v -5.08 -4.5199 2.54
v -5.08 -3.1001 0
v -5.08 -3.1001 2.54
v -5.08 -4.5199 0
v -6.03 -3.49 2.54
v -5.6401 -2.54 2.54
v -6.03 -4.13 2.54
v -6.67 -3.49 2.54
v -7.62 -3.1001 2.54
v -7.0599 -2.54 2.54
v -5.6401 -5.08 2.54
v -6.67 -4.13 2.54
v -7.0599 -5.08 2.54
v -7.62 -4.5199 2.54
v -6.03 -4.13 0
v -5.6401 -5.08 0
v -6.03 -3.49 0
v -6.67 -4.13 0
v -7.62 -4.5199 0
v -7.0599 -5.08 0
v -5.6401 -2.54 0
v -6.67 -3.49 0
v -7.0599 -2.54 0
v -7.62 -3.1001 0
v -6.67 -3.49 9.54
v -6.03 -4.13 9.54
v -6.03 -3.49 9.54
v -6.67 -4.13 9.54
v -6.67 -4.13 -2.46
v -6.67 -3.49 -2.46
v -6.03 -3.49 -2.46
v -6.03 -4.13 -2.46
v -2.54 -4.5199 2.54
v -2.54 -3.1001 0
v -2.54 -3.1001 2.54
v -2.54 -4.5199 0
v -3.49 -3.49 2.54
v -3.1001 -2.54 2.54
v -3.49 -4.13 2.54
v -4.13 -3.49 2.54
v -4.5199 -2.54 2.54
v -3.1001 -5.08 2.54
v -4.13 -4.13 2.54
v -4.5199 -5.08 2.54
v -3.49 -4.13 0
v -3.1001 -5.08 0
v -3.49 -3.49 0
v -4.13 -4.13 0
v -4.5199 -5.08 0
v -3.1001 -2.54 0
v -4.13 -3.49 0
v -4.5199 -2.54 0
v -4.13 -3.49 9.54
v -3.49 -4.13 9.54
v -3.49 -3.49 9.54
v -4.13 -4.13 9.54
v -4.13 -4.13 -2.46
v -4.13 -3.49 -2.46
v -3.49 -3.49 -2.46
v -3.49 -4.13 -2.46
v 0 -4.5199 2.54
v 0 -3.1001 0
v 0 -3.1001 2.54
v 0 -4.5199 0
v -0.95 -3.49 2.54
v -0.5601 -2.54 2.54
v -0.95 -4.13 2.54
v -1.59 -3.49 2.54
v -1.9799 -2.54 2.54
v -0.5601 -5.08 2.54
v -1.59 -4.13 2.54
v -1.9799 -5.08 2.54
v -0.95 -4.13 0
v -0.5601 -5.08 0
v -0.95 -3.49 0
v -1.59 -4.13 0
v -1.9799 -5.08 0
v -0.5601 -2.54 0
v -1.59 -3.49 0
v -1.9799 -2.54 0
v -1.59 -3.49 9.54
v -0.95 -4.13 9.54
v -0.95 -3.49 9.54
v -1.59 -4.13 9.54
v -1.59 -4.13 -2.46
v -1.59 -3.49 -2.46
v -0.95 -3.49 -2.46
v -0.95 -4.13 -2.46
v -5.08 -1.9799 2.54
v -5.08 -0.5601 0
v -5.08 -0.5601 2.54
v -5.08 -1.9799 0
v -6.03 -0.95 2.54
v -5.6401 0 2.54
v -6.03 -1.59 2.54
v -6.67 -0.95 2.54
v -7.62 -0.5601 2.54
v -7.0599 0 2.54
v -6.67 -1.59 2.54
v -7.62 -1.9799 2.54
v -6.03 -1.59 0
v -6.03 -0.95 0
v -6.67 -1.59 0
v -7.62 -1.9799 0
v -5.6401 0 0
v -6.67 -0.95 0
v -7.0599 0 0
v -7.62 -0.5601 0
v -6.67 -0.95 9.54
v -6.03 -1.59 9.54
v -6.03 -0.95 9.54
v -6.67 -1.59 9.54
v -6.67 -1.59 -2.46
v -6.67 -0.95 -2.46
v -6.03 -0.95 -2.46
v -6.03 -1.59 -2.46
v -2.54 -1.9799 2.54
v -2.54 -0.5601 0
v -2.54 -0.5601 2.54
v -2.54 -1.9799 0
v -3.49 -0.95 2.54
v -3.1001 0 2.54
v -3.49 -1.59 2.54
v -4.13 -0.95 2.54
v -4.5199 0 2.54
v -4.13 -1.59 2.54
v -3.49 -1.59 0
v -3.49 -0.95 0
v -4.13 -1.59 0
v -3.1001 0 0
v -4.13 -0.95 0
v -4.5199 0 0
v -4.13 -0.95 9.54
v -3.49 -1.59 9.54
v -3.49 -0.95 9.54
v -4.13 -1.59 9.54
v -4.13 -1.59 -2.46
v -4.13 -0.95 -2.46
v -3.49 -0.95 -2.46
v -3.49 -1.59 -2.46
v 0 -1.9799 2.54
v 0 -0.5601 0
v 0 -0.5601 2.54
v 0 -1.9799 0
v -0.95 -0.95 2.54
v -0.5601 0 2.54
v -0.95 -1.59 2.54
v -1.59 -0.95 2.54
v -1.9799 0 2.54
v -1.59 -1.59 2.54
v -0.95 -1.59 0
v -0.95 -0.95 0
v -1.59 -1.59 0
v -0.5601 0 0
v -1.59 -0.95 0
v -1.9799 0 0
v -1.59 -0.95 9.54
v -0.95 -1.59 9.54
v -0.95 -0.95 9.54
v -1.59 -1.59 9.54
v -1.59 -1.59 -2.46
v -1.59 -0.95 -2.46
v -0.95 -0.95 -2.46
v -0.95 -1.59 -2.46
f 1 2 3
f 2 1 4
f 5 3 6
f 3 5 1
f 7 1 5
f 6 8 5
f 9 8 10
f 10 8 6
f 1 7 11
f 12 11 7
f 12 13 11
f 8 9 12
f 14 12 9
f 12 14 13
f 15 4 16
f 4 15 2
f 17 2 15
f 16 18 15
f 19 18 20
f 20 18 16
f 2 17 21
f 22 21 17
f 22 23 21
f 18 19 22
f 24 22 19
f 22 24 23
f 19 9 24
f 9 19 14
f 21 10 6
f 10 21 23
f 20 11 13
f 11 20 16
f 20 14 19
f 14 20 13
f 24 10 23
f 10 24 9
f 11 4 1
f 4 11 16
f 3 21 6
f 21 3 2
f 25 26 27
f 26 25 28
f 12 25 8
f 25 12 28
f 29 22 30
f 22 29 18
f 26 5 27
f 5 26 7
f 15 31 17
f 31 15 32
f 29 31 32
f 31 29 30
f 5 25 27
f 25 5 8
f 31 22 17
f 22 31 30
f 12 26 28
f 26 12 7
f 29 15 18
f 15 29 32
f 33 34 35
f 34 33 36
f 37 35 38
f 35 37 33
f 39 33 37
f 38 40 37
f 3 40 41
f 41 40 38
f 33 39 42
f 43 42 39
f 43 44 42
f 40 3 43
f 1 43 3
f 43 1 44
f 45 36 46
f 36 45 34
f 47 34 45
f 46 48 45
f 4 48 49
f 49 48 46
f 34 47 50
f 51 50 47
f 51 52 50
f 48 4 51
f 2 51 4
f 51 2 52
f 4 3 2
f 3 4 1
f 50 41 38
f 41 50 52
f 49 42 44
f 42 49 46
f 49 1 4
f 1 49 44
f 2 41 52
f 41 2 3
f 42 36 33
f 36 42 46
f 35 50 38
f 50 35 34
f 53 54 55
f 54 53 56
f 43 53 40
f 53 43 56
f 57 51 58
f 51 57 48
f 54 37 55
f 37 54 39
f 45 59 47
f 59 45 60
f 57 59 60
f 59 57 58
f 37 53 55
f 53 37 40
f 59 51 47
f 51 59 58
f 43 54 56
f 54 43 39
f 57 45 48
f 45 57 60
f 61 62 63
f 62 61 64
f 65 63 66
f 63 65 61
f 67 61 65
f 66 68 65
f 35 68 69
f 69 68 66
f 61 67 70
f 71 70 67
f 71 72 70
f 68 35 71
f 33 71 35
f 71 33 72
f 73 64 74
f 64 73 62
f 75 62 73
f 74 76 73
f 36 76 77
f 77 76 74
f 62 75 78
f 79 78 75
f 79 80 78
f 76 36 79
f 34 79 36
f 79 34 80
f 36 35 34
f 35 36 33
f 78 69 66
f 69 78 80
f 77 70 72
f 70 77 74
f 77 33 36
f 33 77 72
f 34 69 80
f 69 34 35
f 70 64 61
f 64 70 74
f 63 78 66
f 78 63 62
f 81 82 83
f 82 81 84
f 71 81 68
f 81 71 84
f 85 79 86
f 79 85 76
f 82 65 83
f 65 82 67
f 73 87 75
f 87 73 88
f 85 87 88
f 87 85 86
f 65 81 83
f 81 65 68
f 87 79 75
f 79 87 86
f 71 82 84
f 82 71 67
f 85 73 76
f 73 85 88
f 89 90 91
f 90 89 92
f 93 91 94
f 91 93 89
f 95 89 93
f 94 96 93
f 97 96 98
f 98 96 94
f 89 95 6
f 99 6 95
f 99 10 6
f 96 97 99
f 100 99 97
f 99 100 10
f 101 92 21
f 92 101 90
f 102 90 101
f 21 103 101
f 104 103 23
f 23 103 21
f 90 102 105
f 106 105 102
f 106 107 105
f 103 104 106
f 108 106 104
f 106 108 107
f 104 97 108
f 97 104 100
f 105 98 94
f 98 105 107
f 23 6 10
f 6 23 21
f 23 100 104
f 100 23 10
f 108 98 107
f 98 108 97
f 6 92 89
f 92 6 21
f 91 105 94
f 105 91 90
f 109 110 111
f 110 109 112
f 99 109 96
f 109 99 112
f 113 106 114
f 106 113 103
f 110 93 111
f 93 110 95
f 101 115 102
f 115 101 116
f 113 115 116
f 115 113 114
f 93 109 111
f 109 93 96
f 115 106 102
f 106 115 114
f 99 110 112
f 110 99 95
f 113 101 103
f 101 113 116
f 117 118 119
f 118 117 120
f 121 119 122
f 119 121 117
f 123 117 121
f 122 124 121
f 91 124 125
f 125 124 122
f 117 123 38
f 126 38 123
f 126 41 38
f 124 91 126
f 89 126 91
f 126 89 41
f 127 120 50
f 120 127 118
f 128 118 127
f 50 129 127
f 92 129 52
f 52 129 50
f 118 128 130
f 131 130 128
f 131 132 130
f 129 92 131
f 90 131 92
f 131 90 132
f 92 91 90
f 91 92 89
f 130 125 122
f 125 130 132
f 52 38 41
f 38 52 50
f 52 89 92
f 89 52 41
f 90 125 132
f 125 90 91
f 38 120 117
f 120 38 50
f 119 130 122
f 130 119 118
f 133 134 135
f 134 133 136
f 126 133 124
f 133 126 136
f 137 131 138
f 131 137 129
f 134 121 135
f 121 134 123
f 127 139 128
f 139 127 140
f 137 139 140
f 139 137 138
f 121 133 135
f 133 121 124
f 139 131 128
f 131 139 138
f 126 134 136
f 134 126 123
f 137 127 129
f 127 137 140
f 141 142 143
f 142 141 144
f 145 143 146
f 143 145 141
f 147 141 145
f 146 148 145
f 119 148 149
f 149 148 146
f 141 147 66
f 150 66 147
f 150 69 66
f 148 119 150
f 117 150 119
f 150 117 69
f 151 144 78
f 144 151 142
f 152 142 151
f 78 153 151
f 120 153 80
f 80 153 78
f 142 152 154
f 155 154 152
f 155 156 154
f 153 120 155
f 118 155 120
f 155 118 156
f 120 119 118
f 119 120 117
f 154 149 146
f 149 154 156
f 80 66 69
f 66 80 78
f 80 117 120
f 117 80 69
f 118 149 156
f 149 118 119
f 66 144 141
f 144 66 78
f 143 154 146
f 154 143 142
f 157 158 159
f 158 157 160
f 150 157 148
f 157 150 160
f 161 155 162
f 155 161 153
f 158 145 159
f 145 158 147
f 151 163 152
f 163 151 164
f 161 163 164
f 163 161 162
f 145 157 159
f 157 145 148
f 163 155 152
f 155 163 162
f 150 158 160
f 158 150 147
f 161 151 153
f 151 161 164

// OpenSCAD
// pin_headers.scad
//
// Model of through-hole pin headers. 
// 
// Units are metric
//
// "height" is the total length of the pin. Default is 12mm.
// "upper" is the length of the pin above the stopper. Default is 7mm.
// "rows" is the number of rows. Default is 3.
// "cols" is the number of columns. Default is 2.
//
// Examples:
// pin_header( 12, 7, 2, 5);
// pin_header( rows=5 cols=1 );
// By Paul McGovern

module off_pin_header(height=12, upper=7, rows=3, cols=2) {
cl = 2.54;
translate( [ -(rows  * cl/2 ), -(cols  * cl/2 ), 0 ] )
pin_header(height, upper, rows,cols);
}

module pin_header( height=12, upper=7, rows=3, cols=2 ) {

	cl = 2.54;

	translate( [ -(rows  * cl/2 ) + cl /2, -(cols  * cl/2 ) + cl /2, 0 ] ) {

		for( col = [0: cols -1 ] ) {
			for( row = [0 : rows -1 ] ) {

				translate( [ cl * row , cl * col, 0] ) {
	
					color( "gray" )
						translate( [0,0, cl / 2]) {
							intersection() {
								cube( [ cl, cl, cl ], center=true );
								rotate( [0, 0, 45] ) cube( [ 2.8, 2.8, cl ], center=true );
						}
				}

				color( "gold" ) {
					translate( [0,0, (upper - ( height/2 )) + cl ] ) {
						union() {
							cube( [0.64,0.64,height], center=true );
							translate( [0,0, height/2 ] ) scale( 0.64 ) _pin_point();
							translate( [0,0, -height/2 ] ) scale( 0.64 )	rotate([180,0,0] )_pin_point();
						}
					}
				}
			}
		}
	}
}
}

module _pin_point() {
	translate( [-0.5,-0.5, 0])
		polyhedron( 
			points=[[0,0,0],[0,1,0],[1,1,0],[1,0,0],[0.5,0.5,0.5]], 
			faces=[[0,1,2],[0,2,3],[0,1,4],[1,2,4],[2,3,4],[3,0,4]]);
}

off_pin_header();
%pin_header();
